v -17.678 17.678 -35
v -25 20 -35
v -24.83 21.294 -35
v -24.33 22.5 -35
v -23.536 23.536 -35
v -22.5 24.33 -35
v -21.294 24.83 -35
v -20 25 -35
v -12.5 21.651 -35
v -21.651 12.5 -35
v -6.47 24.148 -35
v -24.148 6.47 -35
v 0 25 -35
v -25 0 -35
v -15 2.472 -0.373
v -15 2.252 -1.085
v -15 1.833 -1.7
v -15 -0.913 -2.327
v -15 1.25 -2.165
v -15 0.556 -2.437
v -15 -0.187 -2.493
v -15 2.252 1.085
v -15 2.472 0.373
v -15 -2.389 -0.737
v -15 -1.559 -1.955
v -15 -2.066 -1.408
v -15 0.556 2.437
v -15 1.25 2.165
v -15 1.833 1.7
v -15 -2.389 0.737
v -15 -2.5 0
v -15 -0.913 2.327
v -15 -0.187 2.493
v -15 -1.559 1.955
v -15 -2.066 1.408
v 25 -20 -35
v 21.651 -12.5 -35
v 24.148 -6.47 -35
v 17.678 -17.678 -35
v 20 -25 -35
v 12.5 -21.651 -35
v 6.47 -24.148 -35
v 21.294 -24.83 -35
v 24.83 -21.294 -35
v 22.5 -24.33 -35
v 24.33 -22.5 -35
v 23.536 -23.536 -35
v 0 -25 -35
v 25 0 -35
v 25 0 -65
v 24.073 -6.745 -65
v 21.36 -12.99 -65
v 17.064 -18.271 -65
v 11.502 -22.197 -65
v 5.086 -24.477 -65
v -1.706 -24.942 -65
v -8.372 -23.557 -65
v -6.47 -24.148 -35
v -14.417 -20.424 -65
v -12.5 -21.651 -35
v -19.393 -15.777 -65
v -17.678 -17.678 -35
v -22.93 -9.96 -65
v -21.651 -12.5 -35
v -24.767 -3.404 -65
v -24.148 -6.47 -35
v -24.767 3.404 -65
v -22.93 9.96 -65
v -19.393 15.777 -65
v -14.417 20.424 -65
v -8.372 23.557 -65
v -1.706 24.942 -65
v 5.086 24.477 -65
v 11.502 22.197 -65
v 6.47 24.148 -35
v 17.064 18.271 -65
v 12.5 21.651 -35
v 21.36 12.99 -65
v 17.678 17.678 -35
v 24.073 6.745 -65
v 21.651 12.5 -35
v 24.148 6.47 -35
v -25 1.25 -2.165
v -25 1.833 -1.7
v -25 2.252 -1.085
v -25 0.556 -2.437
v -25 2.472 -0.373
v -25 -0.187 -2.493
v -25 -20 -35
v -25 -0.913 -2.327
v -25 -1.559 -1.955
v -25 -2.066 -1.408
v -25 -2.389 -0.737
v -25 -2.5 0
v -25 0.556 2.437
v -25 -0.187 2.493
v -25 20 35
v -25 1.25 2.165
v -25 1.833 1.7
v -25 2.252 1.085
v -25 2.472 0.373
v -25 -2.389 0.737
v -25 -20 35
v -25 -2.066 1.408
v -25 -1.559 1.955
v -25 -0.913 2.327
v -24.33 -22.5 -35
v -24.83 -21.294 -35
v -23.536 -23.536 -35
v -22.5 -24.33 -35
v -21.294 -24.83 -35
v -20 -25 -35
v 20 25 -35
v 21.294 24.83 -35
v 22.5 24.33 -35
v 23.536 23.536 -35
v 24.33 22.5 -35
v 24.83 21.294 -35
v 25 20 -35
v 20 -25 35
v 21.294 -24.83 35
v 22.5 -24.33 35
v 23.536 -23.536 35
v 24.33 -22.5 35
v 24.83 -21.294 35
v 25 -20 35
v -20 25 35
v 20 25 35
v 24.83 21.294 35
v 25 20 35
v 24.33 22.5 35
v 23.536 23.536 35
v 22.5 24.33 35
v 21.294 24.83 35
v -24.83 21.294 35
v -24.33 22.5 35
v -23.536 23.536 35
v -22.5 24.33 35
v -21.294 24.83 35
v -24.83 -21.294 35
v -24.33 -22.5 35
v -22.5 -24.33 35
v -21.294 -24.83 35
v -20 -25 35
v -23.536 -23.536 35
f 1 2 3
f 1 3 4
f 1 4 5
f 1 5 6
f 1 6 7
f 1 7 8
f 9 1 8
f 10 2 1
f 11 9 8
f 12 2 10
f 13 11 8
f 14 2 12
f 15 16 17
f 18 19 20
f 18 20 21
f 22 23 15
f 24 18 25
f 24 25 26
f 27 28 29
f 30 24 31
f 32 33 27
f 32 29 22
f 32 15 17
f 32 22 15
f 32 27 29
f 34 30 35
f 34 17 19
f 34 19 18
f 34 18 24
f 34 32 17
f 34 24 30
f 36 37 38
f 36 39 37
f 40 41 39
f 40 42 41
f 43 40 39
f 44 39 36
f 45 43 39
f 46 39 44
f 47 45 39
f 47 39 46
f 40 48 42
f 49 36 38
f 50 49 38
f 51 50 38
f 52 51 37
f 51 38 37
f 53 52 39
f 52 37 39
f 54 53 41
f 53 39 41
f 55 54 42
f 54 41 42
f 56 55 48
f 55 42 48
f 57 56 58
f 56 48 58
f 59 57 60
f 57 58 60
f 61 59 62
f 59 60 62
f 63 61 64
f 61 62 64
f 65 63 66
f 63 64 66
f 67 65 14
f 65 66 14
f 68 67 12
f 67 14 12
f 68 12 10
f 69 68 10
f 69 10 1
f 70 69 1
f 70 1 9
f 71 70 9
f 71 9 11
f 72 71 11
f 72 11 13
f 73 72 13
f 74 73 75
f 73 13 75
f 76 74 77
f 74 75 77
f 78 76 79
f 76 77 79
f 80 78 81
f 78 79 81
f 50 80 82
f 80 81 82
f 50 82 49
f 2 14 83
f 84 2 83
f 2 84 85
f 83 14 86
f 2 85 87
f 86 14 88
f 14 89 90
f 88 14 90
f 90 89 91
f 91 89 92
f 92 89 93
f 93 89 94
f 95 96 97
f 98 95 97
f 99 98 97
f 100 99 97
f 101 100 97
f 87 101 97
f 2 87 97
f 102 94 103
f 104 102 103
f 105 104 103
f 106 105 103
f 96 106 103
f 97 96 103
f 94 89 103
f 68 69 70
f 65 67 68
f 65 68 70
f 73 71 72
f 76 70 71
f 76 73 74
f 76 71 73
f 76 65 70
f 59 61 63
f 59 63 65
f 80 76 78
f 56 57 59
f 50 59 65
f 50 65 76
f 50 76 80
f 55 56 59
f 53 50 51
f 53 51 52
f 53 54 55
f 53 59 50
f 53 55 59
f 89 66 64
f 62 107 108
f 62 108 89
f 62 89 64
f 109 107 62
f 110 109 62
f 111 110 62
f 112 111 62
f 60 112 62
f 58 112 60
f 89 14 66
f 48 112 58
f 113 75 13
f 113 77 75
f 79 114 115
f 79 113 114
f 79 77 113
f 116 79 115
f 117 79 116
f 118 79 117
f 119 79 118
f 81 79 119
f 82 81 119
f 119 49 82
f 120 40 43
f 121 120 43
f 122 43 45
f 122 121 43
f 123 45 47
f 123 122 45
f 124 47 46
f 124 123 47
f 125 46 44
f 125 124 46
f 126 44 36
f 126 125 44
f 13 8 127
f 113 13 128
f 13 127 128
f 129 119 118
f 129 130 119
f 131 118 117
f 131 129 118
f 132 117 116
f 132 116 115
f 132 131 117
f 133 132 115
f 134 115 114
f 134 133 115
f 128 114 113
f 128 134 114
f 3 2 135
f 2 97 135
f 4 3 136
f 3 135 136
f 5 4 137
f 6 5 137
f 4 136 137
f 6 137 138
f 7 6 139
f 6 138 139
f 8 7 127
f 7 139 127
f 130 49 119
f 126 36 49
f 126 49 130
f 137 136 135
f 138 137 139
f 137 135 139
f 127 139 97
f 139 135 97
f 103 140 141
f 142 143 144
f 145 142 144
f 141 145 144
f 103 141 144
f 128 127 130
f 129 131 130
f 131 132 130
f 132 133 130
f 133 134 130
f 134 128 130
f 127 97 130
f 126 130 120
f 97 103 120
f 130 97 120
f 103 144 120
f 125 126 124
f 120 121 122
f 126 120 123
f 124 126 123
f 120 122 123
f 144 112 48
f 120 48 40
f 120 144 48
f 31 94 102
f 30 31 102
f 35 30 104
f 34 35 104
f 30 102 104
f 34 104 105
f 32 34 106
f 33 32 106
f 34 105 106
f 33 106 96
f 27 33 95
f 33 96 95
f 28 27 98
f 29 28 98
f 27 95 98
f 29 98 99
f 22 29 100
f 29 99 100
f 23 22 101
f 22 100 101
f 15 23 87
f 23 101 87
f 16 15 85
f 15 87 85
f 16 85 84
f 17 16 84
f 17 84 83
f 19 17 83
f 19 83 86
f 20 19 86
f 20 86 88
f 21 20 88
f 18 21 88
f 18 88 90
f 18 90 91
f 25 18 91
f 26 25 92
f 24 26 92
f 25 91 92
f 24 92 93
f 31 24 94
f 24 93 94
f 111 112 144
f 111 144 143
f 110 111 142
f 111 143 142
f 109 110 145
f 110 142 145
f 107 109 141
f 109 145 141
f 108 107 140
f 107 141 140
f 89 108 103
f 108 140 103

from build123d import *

# Parameters (mm, degrees)
F0_W     = 50
F0_H     = 70
F1_DEPTH = 25
F2_R     = 25
F3_DEPTH = 30
F4_R     = 5
F5_R     = 2.5
F6_DEPTH = 10


with BuildPart() as f1:
    # F0 (on Front) → F1 (new body, symmetric)
    with BuildSketch(Plane.XZ):
        Rectangle(F0_W, F0_H)
    extrude(amount=F1_DEPTH, both=True)

    # F2 (on face) → F3 (join)
    with BuildSketch(Plane(origin=(0, 0, -35), x_dir=(1, 0, 0), z_dir=(0, 0, -1))):
        Circle(F2_R)
    extrude(amount=F3_DEPTH)

    # F4
    f4_edges = [f1.edges().sort_by_distance(p)[0] for p in [
        (25, -25, 0),
        (-25, -25, 0),
        (-25, 25, 0),
        (25, 25, 0),
    ]]
    fillet(f4_edges, radius=F4_R)

    # F5 (on face) → F6 (cut)
    with BuildSketch(Plane(origin=(-25, 0, 0), x_dir=(0, -1, 0), z_dir=(-1, 0, 0))):
        Circle(F5_R)
    extrude(amount=-F6_DEPTH, mode=Mode.SUBTRACT)


solid = f1.part
